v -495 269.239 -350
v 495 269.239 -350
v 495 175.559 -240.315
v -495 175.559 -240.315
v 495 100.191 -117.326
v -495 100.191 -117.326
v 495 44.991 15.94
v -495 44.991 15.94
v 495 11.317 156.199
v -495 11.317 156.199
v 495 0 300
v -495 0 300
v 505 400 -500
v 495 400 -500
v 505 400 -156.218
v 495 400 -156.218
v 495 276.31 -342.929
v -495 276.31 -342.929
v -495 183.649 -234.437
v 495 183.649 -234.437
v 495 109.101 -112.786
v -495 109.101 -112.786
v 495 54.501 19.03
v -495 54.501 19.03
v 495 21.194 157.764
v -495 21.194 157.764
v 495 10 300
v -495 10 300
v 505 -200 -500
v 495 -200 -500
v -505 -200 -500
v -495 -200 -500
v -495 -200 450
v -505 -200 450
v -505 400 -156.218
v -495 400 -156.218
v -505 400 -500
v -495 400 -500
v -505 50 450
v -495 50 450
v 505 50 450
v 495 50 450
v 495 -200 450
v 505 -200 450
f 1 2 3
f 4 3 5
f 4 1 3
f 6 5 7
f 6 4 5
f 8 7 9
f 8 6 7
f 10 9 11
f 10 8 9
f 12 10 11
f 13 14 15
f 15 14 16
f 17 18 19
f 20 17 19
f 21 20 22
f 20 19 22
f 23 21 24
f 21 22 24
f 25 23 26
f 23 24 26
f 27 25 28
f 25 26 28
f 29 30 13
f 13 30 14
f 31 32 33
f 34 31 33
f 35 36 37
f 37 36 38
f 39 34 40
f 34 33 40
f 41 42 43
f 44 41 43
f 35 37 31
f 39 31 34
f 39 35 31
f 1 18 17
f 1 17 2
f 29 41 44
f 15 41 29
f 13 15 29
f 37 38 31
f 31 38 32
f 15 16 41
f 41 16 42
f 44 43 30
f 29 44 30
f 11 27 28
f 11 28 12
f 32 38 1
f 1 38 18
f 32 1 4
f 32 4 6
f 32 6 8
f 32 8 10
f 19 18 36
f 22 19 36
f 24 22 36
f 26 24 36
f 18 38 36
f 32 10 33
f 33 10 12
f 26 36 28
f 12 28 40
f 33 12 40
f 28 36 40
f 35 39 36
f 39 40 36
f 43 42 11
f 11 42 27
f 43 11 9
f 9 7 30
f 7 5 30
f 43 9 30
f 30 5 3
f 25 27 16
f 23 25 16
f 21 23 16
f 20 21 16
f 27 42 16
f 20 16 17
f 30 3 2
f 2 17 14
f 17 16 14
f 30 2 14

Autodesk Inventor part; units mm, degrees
ref_plane "YZ Plane" through (0, 0, 0) normal (1, 0, 0) x (0, 1, 0)
ref_plane "XZ Plane" through (0, 0, 0) normal (0, 1, 0) x (-1, 0, 0)
ref_plane "XY Plane" through (0, 0, 0) normal (0, 0, 1) x (1, 0, 0)
sketch "スケッチ1" plane through (0, 0, 0) normal (1, 0, 0) x (0, 1, 0)
  line L0 (10, 300) -> (0, 300)
  arc A0 (0, 300) -> (269.2388, -350) centre (919.2388, 300) ccw
  line L1 (0, -512.133) -> (0, 435.3555) projected
  arc A1 (10, 300) -> (276.3099, -342.9289) centre (919.2388, 300) ccw
  line L2 (-261.4236, 0) -> (1116.0159, 0) projected
  line L3 (276.3099, -342.9289) -> (269.2388, -350)
  point P0 (0, 0)
  dimension "d0" = 300
  dimension "d1" = 10
  dimension "d2" = 45
  dimension "d3" = 350
extrude "押し出し1" add sketch "スケッチ1" along normal mid plane 990 contours A1 L2 A0 L0 | A1 L3 A0 L2
sketch "スケッチ2" plane through (495, 0, 0) normal (1, 0, 0) x (0, 0, -1)
  line L0 (-450, 50) -> (-450, -200)
  line L1 (-450, -200) -> (500, -200)
  line L2 (500, -200) -> (500, 400)
  line L3 (500, 400) -> (156.2178, 400)
  line L4 (156.2178, 400) -> (-450, 50)
  line L5 (690, 0) -> (-640, 0) projected
  line L6 (-300, 10) -> (-300, 0) projected
  point P0 (0, 0)
  point P1 (350, 269.2388)
  dimension "d6" = 200
  dimension "d7" = 150
  dimension "d8" = 600
  dimension "d9" = 150
  dimension "d10" = 30
  dimension "d11" = 250
extrude "押し出し2" add sketch "スケッチ2" along normal blind 10
mirror "ミラー1" about plane through (0, 0, 0) normal (1, 0, 0) of "押し出し2"
properties part number "R-wing"
